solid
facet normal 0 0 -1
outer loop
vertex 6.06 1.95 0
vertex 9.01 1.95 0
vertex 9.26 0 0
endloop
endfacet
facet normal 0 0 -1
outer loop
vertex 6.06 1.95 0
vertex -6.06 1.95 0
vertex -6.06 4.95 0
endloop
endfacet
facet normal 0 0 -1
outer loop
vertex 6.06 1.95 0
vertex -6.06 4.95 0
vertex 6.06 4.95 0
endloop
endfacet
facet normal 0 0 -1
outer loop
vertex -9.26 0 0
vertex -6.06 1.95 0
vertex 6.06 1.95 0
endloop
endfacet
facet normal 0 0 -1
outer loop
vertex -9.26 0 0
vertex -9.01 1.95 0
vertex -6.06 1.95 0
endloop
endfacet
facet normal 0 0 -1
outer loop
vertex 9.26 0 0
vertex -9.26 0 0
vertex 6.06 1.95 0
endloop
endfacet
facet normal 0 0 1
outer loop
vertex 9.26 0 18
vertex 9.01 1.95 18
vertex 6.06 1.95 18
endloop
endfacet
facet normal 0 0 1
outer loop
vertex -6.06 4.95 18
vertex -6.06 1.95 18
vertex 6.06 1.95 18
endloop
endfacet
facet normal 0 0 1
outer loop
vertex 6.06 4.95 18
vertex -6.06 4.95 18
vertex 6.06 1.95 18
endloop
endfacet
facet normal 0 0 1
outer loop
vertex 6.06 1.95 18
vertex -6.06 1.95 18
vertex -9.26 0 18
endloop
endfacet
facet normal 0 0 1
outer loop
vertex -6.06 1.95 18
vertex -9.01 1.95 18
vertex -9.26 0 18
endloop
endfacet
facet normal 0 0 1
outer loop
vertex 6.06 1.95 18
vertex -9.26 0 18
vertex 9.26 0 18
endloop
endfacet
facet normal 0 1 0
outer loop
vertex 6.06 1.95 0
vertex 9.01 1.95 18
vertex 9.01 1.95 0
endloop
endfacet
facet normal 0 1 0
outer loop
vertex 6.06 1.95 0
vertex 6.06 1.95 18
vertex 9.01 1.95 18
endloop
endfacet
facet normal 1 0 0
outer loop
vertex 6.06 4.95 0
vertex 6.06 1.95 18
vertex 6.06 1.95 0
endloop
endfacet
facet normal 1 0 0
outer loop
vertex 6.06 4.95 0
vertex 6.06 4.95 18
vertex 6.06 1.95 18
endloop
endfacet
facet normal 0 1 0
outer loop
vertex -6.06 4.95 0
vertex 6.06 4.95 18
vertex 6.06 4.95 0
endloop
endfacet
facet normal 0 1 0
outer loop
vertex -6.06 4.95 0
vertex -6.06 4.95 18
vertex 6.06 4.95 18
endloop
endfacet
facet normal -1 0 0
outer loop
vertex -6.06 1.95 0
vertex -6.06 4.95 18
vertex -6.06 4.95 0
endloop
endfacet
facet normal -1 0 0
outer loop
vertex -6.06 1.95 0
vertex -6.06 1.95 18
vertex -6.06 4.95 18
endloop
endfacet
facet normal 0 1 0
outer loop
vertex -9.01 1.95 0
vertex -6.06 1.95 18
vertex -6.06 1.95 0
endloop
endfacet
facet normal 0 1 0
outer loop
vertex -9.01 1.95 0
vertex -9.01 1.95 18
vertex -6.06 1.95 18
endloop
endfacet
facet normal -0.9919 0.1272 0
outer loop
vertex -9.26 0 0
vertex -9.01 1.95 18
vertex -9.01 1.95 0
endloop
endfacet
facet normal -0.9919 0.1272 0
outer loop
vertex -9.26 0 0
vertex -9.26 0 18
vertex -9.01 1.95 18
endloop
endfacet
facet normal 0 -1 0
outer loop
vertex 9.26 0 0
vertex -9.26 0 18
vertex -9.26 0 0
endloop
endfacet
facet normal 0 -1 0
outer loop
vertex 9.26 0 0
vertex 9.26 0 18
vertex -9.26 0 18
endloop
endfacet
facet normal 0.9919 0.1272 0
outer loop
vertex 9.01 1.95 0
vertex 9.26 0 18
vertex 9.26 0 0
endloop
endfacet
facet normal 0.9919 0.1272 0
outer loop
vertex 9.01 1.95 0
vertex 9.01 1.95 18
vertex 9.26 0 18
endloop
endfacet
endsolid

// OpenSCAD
hotshoeWidth = 18.52;
hotshoeThickness = 1.95;
hotshoeLength = 18;
hotshoeInset = 3.2;
hotshoeTaper = 0.25;

    
    
module hotshoe(coverStickout = 0) {    
hotshoeProfile = [
    [-hotshoeWidth/2, 0],
    [-hotshoeWidth/2+hotshoeTaper, hotshoeThickness],
    [-hotshoeWidth/2+hotshoeInset, hotshoeThickness],
    [-hotshoeWidth/2+hotshoeInset, hotshoeThickness+coverStickout],
    [hotshoeWidth/2-hotshoeInset, hotshoeThickness++coverStickout],
    [hotshoeWidth/2-hotshoeInset, hotshoeThickness],
    [hotshoeWidth/2-hotshoeTaper, hotshoeThickness],
    [hotshoeWidth/2, 0] ];

    linear_extrude(height=hotshoeLength) polygon(hotshoeProfile);
}

hotshoe(coverStickout = 3);
